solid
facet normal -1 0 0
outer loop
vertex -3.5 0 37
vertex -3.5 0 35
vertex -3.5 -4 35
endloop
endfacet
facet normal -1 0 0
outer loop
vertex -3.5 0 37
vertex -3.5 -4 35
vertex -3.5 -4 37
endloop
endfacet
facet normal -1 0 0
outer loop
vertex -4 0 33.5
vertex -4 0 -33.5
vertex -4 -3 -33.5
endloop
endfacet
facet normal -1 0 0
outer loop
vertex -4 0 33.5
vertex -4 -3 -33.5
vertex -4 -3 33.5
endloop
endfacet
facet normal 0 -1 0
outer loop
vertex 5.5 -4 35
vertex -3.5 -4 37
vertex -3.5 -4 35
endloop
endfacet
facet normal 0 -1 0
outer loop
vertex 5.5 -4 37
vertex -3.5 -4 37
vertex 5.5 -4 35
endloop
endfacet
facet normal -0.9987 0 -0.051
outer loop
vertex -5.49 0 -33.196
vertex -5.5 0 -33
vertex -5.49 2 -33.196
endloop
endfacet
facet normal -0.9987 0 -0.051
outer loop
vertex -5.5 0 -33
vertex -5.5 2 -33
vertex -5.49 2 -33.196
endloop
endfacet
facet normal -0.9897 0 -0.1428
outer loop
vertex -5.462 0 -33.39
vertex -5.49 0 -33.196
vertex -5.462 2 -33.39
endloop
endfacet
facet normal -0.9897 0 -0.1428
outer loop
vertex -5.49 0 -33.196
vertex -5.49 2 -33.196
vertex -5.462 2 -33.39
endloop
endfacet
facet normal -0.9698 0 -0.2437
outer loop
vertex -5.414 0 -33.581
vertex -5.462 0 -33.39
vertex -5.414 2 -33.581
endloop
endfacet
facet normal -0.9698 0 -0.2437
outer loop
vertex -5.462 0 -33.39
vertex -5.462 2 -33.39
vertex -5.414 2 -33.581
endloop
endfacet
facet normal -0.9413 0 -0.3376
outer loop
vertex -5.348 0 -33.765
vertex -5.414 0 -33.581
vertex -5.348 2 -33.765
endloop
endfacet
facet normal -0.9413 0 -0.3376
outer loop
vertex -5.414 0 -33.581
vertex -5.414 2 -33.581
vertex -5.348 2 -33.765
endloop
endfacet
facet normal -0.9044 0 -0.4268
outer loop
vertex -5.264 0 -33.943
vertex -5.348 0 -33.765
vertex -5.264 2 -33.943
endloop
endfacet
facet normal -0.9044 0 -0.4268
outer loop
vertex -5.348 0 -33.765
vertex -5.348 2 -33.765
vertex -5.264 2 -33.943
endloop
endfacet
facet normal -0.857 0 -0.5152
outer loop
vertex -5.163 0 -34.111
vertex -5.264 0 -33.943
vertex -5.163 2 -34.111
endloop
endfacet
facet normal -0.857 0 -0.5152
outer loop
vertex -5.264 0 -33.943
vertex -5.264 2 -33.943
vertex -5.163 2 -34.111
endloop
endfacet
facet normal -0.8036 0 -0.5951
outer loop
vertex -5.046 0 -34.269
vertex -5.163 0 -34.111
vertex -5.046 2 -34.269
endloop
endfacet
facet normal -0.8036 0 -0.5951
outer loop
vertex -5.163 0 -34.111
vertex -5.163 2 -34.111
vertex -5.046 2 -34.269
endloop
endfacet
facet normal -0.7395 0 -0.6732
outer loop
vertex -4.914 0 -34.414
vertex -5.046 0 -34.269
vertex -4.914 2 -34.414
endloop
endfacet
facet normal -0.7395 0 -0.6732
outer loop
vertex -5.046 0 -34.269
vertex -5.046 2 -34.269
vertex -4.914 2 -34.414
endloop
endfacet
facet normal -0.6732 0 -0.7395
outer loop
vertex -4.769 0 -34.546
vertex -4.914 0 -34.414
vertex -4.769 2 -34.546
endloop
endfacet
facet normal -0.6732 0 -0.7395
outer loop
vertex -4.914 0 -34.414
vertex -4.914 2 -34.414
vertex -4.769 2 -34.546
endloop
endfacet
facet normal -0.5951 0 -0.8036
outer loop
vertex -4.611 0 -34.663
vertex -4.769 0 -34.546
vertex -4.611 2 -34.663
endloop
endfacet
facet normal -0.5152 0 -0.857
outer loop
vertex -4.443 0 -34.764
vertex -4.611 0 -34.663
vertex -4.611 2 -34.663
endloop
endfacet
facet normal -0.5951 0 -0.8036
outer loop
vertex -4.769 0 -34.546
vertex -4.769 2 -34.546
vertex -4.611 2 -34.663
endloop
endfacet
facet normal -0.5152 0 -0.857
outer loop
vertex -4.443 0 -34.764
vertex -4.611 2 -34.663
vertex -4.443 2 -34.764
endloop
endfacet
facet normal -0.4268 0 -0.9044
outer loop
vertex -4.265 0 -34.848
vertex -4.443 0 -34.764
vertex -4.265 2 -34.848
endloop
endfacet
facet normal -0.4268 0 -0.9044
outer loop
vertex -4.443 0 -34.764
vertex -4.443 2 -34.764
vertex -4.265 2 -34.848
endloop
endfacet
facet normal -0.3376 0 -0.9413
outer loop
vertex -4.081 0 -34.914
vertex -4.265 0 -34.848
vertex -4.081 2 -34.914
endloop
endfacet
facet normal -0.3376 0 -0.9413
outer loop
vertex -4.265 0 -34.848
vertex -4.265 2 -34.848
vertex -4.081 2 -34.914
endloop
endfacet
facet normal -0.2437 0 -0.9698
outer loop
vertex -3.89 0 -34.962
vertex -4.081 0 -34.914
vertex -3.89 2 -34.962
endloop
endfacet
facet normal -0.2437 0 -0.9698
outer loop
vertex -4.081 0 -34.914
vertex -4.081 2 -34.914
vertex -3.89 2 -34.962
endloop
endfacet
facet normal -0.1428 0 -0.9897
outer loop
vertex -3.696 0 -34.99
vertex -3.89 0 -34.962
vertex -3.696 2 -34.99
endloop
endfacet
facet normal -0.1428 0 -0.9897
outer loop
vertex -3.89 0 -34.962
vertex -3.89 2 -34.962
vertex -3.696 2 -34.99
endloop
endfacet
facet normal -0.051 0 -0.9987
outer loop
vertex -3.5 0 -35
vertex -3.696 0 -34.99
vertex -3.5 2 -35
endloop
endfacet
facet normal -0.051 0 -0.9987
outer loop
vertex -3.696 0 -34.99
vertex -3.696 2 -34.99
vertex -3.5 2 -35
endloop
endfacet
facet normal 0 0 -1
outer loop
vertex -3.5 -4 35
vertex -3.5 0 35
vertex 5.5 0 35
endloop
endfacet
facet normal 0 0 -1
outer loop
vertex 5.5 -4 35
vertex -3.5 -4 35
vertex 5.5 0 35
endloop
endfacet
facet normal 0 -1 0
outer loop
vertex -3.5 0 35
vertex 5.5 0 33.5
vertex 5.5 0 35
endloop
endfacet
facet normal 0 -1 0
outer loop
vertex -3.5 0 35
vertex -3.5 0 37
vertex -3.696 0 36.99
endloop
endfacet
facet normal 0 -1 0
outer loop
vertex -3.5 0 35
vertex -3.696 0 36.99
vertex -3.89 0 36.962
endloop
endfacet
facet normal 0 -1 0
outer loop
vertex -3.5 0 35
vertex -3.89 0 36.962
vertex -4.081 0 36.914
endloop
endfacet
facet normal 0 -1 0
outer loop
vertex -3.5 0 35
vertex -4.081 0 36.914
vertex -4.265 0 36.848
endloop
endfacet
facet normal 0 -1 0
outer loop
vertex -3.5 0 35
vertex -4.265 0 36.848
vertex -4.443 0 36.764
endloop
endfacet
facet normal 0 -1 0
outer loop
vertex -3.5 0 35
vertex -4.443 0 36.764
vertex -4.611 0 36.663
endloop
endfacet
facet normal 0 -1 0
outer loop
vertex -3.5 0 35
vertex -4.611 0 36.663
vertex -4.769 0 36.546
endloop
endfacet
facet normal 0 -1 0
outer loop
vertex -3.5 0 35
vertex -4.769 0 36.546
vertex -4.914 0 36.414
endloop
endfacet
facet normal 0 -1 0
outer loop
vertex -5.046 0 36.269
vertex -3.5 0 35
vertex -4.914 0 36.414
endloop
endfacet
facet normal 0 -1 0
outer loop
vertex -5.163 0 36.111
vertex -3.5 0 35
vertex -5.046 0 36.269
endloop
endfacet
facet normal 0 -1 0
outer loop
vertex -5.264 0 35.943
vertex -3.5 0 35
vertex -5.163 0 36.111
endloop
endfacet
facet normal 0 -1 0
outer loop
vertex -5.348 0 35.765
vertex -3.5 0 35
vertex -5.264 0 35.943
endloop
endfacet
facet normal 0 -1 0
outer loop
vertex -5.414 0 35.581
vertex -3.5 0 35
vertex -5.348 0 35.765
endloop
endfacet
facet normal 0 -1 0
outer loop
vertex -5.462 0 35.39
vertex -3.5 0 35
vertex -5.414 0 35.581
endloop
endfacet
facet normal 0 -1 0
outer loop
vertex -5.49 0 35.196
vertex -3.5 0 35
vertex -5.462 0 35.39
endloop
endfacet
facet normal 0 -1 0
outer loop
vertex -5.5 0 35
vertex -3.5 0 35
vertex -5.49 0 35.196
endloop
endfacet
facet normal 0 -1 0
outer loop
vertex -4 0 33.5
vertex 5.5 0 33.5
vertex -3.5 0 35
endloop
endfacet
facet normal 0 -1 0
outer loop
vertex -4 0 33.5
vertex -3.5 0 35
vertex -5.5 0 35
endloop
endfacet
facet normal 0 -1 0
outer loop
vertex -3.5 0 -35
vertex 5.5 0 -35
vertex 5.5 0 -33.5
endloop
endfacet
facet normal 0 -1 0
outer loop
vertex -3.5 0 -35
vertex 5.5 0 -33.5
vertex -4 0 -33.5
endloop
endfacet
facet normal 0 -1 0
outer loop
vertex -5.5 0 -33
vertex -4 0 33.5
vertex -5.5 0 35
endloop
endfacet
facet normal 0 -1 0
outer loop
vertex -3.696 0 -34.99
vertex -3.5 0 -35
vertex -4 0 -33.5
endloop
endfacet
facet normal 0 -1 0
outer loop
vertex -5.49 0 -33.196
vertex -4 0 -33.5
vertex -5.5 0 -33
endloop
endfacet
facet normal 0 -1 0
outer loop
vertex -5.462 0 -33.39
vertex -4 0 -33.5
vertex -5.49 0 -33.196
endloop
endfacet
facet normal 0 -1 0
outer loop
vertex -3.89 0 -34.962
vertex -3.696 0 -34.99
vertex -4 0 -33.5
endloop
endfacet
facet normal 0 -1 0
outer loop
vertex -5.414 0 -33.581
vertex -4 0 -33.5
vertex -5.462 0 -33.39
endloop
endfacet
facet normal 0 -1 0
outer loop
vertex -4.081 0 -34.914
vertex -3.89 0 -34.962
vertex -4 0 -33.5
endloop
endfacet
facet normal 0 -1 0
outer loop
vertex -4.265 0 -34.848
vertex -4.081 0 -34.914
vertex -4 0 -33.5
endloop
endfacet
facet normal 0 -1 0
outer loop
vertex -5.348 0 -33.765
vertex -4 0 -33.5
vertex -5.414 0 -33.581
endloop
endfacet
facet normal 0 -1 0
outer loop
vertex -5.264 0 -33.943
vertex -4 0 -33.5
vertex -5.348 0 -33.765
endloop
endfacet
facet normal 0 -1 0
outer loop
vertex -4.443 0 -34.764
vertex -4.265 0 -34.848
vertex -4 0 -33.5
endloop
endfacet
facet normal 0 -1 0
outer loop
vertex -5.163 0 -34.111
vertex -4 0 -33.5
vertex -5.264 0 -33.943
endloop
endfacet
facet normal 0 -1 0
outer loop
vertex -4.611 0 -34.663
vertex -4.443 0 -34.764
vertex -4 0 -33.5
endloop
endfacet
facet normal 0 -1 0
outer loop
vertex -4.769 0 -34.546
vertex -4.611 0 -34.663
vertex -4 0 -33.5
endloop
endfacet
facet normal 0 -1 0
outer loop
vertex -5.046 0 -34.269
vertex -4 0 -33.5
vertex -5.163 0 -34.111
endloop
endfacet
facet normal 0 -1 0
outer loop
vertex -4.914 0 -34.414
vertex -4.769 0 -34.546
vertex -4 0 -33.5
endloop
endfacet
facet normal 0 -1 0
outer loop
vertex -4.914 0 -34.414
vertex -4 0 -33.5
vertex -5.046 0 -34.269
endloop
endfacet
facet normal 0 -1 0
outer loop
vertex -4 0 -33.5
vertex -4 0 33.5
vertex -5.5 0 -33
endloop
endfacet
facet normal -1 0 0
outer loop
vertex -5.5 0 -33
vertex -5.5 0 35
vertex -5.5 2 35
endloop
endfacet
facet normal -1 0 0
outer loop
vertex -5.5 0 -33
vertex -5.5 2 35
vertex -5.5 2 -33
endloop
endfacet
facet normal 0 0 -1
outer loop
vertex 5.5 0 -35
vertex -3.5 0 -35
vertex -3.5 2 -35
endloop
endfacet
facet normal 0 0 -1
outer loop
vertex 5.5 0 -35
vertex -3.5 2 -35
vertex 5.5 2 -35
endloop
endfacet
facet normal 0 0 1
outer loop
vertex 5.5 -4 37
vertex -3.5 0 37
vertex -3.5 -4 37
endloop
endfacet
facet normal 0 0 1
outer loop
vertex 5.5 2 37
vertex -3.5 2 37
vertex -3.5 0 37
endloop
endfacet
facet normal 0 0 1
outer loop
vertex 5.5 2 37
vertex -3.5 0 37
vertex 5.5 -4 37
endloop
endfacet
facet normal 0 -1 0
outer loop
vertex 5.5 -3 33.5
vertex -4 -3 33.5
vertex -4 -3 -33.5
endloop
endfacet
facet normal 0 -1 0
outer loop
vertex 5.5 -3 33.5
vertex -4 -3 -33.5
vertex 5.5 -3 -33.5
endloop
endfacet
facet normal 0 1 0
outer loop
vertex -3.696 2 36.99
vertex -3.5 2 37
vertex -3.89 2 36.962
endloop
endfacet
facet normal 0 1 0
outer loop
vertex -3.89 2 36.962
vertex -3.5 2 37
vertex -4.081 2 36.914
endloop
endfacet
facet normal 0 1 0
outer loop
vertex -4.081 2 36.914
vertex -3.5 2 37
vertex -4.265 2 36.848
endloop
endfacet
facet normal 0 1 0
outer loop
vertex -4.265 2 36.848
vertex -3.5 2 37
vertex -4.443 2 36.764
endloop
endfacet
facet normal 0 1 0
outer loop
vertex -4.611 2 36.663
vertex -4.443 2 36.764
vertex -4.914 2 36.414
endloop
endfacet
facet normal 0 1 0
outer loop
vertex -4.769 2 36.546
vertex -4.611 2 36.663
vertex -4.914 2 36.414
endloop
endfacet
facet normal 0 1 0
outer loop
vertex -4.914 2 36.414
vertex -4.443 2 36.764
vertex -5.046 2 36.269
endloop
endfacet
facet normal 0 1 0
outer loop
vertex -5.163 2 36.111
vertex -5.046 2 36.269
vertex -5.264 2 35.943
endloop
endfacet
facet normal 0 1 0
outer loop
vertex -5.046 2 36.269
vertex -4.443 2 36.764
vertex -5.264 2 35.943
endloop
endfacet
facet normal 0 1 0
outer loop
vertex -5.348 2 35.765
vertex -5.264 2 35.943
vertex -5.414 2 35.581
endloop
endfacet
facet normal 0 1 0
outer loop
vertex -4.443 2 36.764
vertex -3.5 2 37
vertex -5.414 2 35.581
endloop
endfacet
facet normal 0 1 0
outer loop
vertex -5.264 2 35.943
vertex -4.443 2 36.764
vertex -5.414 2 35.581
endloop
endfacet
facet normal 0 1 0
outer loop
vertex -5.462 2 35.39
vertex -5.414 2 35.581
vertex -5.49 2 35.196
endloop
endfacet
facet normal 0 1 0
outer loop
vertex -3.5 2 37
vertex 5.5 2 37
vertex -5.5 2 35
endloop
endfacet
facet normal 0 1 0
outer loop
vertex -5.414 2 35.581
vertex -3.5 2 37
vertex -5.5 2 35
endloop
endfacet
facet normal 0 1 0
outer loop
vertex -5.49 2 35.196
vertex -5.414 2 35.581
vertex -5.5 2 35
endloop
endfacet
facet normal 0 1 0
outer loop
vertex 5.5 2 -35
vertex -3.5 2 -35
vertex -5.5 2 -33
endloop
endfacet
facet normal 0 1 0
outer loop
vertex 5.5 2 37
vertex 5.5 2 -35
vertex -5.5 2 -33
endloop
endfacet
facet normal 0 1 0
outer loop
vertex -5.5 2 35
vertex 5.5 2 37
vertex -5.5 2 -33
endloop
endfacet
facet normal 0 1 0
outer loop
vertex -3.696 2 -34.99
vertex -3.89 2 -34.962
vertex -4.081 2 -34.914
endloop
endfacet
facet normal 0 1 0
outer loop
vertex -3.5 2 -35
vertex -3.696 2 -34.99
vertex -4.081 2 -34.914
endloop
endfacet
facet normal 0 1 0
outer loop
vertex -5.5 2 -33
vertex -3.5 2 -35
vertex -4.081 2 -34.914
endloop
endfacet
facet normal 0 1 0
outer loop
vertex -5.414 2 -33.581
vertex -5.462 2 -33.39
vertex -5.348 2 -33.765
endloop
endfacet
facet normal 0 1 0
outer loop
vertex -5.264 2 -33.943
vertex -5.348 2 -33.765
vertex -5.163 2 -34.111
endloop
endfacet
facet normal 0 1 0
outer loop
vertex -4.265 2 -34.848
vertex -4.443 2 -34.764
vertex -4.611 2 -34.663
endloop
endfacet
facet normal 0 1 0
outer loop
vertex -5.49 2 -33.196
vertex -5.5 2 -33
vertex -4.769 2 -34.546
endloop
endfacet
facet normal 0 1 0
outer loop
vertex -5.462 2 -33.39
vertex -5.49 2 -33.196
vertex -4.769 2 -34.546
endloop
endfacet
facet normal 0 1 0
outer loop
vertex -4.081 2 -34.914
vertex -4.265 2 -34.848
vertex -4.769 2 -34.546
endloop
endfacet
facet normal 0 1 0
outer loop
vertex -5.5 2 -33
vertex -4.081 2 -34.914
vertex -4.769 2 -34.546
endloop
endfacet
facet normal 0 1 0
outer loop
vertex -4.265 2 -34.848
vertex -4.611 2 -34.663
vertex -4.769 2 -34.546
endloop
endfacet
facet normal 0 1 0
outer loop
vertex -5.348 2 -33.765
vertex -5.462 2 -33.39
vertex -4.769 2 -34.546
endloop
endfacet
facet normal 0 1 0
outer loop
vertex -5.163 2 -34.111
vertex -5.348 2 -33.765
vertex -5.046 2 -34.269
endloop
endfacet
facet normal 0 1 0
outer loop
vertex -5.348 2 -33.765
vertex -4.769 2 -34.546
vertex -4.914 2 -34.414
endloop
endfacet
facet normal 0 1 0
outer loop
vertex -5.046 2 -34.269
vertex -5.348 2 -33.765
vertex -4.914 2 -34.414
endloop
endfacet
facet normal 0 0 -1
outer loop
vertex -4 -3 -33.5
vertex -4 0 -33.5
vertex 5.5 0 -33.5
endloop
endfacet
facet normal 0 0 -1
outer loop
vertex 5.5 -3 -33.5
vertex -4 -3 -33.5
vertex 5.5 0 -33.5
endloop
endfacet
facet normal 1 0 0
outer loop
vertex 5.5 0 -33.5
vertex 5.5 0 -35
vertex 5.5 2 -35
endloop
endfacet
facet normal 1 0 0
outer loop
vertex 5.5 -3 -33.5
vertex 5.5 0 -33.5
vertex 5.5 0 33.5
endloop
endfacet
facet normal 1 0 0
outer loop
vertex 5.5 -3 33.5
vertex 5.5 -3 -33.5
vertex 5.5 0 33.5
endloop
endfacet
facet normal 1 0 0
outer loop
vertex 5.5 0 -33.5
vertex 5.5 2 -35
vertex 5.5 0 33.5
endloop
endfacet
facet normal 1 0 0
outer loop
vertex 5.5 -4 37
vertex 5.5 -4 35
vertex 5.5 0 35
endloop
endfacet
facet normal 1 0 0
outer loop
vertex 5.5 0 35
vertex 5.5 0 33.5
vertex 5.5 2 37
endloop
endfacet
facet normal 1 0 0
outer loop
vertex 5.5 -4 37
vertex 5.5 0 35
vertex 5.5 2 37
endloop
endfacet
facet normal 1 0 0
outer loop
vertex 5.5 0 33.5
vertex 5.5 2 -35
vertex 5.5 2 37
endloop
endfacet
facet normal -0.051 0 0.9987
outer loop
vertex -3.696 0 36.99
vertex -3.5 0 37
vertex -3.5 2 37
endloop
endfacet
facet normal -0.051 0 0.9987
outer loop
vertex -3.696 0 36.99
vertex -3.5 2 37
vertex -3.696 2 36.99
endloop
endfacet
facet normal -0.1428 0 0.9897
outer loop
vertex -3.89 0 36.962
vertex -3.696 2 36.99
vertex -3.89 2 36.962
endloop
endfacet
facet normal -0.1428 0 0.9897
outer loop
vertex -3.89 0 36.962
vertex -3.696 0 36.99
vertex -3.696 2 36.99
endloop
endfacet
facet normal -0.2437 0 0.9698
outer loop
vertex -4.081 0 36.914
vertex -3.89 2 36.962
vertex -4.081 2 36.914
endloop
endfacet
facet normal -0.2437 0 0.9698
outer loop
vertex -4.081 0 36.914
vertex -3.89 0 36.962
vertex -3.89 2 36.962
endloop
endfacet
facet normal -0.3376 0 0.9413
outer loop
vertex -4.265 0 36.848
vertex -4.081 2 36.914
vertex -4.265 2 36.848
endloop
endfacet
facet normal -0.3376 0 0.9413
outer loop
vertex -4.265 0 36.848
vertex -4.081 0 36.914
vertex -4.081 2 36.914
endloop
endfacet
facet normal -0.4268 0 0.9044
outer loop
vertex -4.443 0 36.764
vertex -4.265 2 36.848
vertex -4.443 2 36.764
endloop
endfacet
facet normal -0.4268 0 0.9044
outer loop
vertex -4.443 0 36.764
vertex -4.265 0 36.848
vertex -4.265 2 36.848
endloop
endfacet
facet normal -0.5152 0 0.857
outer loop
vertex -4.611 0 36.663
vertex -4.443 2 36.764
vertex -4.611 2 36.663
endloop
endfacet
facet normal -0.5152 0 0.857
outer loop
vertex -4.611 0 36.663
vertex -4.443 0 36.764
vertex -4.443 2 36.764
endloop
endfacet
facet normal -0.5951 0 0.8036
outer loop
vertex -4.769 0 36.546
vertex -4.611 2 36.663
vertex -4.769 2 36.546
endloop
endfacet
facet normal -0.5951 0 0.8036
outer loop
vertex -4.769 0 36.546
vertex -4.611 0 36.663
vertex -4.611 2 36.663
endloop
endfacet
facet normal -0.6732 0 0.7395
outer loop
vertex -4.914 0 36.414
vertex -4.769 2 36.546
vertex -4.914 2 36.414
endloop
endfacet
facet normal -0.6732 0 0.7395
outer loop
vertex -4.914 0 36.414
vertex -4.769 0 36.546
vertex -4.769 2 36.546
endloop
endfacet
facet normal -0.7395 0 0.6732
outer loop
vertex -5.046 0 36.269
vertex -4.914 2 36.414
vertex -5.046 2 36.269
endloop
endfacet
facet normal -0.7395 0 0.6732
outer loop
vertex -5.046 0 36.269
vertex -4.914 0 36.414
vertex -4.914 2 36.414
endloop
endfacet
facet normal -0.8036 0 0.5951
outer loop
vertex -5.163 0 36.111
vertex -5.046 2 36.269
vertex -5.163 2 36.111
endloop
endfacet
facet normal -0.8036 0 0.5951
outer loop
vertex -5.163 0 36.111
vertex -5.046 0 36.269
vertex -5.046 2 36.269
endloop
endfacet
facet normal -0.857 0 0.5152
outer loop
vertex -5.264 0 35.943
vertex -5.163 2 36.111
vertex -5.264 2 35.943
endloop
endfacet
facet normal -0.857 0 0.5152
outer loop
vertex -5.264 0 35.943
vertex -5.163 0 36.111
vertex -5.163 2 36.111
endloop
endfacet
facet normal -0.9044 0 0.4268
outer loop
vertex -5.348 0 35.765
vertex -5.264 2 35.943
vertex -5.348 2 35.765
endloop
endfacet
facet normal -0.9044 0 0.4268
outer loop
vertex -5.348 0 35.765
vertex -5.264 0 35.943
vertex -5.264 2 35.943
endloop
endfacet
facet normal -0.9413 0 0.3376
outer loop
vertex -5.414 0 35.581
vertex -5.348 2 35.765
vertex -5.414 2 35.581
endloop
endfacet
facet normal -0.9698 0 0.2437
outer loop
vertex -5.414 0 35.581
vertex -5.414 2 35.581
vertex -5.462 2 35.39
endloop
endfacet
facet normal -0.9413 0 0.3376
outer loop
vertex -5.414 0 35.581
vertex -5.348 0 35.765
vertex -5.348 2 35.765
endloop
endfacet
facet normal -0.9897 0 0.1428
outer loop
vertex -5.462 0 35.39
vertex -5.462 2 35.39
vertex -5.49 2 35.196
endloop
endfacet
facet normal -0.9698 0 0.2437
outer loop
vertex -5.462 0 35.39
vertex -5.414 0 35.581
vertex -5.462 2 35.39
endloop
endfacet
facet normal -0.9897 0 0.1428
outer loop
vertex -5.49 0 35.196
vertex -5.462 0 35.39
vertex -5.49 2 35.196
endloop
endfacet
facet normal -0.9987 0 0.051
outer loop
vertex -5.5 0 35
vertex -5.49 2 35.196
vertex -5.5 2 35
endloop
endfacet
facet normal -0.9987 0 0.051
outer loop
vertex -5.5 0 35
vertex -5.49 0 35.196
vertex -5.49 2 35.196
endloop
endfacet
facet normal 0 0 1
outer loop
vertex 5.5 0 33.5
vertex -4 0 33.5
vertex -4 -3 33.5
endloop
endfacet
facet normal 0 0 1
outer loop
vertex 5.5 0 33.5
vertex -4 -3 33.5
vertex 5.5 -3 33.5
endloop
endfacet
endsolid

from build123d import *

# Parameters (mm, degrees)
EXTRUDE_1_DEPTH     = 2
SKETCH_2_W          = 9
SKETCH_2_H          = 2
EXTRUDE_2_DEPTH     = 4
SKETCH_3_W          = 9.5
SKETCH_3_H          = 67
EXTRUDE_3_DEPTH     = 3
SKETCH_4_W          = 16.00447387
SKETCH_4_H          = 2
CUT_EXTRUDE_1_DEPTH = 10
FILLET_1_R          = 2


with BuildPart() as part:
    # 草图1 → 凸台-拉伸1 (new body)
    with BuildSketch(Plane(origin=(0, 0, 0), x_dir=(1, 0, 0), z_dir=(0, 1, 0))):
        with BuildLine():
            Line((-3.5, 37), (5.5, 37))
            Line((5.5, 37), (5.5, -37))
            Line((5.5, -37), (-3.5, -37))
            ThreePointArc((-3.5, -37), (-4.914213562, -36.414213562), (-5.5, -35))
            Line((-5.5, -35), (-5.5, 35))
            ThreePointArc((-5.5, 35), (-4.914213562, 36.414213562), (-3.5, 37))
        make_face()
    extrude(amount=EXTRUDE_1_DEPTH)

    # 草图2 → 凸台-拉伸2 (add)
    with BuildSketch(Plane.XZ):
        with Locations((1, 36)):
            Rectangle(SKETCH_2_W, SKETCH_2_H)
        with Locations((1, -36)):
            Rectangle(SKETCH_2_W, SKETCH_2_H)
    extrude(amount=EXTRUDE_2_DEPTH)

    # 草图3 → 凸台-拉伸3 (add)
    with BuildSketch(Plane.XZ):
        with Locations((0.75, 0)):
            Rectangle(SKETCH_3_W, SKETCH_3_H)
    extrude(amount=EXTRUDE_3_DEPTH)

    # 草图4 → 切除-拉伸1 (cut)
    with BuildSketch(Plane.XZ.offset(4)):
        with Locations((-2.502236935, -36)):
            Rectangle(SKETCH_4_W, SKETCH_4_H)
    extrude(amount=-CUT_EXTRUDE_1_DEPTH, mode=Mode.SUBTRACT)

    # 圆角1
    fillet_1_edges = [part.edges().sort_by_distance(p)[0] for p in [
        (-5.5, 1, -35),
    ]]
    fillet(fillet_1_edges, radius=FILLET_1_R)


solid = part.part
